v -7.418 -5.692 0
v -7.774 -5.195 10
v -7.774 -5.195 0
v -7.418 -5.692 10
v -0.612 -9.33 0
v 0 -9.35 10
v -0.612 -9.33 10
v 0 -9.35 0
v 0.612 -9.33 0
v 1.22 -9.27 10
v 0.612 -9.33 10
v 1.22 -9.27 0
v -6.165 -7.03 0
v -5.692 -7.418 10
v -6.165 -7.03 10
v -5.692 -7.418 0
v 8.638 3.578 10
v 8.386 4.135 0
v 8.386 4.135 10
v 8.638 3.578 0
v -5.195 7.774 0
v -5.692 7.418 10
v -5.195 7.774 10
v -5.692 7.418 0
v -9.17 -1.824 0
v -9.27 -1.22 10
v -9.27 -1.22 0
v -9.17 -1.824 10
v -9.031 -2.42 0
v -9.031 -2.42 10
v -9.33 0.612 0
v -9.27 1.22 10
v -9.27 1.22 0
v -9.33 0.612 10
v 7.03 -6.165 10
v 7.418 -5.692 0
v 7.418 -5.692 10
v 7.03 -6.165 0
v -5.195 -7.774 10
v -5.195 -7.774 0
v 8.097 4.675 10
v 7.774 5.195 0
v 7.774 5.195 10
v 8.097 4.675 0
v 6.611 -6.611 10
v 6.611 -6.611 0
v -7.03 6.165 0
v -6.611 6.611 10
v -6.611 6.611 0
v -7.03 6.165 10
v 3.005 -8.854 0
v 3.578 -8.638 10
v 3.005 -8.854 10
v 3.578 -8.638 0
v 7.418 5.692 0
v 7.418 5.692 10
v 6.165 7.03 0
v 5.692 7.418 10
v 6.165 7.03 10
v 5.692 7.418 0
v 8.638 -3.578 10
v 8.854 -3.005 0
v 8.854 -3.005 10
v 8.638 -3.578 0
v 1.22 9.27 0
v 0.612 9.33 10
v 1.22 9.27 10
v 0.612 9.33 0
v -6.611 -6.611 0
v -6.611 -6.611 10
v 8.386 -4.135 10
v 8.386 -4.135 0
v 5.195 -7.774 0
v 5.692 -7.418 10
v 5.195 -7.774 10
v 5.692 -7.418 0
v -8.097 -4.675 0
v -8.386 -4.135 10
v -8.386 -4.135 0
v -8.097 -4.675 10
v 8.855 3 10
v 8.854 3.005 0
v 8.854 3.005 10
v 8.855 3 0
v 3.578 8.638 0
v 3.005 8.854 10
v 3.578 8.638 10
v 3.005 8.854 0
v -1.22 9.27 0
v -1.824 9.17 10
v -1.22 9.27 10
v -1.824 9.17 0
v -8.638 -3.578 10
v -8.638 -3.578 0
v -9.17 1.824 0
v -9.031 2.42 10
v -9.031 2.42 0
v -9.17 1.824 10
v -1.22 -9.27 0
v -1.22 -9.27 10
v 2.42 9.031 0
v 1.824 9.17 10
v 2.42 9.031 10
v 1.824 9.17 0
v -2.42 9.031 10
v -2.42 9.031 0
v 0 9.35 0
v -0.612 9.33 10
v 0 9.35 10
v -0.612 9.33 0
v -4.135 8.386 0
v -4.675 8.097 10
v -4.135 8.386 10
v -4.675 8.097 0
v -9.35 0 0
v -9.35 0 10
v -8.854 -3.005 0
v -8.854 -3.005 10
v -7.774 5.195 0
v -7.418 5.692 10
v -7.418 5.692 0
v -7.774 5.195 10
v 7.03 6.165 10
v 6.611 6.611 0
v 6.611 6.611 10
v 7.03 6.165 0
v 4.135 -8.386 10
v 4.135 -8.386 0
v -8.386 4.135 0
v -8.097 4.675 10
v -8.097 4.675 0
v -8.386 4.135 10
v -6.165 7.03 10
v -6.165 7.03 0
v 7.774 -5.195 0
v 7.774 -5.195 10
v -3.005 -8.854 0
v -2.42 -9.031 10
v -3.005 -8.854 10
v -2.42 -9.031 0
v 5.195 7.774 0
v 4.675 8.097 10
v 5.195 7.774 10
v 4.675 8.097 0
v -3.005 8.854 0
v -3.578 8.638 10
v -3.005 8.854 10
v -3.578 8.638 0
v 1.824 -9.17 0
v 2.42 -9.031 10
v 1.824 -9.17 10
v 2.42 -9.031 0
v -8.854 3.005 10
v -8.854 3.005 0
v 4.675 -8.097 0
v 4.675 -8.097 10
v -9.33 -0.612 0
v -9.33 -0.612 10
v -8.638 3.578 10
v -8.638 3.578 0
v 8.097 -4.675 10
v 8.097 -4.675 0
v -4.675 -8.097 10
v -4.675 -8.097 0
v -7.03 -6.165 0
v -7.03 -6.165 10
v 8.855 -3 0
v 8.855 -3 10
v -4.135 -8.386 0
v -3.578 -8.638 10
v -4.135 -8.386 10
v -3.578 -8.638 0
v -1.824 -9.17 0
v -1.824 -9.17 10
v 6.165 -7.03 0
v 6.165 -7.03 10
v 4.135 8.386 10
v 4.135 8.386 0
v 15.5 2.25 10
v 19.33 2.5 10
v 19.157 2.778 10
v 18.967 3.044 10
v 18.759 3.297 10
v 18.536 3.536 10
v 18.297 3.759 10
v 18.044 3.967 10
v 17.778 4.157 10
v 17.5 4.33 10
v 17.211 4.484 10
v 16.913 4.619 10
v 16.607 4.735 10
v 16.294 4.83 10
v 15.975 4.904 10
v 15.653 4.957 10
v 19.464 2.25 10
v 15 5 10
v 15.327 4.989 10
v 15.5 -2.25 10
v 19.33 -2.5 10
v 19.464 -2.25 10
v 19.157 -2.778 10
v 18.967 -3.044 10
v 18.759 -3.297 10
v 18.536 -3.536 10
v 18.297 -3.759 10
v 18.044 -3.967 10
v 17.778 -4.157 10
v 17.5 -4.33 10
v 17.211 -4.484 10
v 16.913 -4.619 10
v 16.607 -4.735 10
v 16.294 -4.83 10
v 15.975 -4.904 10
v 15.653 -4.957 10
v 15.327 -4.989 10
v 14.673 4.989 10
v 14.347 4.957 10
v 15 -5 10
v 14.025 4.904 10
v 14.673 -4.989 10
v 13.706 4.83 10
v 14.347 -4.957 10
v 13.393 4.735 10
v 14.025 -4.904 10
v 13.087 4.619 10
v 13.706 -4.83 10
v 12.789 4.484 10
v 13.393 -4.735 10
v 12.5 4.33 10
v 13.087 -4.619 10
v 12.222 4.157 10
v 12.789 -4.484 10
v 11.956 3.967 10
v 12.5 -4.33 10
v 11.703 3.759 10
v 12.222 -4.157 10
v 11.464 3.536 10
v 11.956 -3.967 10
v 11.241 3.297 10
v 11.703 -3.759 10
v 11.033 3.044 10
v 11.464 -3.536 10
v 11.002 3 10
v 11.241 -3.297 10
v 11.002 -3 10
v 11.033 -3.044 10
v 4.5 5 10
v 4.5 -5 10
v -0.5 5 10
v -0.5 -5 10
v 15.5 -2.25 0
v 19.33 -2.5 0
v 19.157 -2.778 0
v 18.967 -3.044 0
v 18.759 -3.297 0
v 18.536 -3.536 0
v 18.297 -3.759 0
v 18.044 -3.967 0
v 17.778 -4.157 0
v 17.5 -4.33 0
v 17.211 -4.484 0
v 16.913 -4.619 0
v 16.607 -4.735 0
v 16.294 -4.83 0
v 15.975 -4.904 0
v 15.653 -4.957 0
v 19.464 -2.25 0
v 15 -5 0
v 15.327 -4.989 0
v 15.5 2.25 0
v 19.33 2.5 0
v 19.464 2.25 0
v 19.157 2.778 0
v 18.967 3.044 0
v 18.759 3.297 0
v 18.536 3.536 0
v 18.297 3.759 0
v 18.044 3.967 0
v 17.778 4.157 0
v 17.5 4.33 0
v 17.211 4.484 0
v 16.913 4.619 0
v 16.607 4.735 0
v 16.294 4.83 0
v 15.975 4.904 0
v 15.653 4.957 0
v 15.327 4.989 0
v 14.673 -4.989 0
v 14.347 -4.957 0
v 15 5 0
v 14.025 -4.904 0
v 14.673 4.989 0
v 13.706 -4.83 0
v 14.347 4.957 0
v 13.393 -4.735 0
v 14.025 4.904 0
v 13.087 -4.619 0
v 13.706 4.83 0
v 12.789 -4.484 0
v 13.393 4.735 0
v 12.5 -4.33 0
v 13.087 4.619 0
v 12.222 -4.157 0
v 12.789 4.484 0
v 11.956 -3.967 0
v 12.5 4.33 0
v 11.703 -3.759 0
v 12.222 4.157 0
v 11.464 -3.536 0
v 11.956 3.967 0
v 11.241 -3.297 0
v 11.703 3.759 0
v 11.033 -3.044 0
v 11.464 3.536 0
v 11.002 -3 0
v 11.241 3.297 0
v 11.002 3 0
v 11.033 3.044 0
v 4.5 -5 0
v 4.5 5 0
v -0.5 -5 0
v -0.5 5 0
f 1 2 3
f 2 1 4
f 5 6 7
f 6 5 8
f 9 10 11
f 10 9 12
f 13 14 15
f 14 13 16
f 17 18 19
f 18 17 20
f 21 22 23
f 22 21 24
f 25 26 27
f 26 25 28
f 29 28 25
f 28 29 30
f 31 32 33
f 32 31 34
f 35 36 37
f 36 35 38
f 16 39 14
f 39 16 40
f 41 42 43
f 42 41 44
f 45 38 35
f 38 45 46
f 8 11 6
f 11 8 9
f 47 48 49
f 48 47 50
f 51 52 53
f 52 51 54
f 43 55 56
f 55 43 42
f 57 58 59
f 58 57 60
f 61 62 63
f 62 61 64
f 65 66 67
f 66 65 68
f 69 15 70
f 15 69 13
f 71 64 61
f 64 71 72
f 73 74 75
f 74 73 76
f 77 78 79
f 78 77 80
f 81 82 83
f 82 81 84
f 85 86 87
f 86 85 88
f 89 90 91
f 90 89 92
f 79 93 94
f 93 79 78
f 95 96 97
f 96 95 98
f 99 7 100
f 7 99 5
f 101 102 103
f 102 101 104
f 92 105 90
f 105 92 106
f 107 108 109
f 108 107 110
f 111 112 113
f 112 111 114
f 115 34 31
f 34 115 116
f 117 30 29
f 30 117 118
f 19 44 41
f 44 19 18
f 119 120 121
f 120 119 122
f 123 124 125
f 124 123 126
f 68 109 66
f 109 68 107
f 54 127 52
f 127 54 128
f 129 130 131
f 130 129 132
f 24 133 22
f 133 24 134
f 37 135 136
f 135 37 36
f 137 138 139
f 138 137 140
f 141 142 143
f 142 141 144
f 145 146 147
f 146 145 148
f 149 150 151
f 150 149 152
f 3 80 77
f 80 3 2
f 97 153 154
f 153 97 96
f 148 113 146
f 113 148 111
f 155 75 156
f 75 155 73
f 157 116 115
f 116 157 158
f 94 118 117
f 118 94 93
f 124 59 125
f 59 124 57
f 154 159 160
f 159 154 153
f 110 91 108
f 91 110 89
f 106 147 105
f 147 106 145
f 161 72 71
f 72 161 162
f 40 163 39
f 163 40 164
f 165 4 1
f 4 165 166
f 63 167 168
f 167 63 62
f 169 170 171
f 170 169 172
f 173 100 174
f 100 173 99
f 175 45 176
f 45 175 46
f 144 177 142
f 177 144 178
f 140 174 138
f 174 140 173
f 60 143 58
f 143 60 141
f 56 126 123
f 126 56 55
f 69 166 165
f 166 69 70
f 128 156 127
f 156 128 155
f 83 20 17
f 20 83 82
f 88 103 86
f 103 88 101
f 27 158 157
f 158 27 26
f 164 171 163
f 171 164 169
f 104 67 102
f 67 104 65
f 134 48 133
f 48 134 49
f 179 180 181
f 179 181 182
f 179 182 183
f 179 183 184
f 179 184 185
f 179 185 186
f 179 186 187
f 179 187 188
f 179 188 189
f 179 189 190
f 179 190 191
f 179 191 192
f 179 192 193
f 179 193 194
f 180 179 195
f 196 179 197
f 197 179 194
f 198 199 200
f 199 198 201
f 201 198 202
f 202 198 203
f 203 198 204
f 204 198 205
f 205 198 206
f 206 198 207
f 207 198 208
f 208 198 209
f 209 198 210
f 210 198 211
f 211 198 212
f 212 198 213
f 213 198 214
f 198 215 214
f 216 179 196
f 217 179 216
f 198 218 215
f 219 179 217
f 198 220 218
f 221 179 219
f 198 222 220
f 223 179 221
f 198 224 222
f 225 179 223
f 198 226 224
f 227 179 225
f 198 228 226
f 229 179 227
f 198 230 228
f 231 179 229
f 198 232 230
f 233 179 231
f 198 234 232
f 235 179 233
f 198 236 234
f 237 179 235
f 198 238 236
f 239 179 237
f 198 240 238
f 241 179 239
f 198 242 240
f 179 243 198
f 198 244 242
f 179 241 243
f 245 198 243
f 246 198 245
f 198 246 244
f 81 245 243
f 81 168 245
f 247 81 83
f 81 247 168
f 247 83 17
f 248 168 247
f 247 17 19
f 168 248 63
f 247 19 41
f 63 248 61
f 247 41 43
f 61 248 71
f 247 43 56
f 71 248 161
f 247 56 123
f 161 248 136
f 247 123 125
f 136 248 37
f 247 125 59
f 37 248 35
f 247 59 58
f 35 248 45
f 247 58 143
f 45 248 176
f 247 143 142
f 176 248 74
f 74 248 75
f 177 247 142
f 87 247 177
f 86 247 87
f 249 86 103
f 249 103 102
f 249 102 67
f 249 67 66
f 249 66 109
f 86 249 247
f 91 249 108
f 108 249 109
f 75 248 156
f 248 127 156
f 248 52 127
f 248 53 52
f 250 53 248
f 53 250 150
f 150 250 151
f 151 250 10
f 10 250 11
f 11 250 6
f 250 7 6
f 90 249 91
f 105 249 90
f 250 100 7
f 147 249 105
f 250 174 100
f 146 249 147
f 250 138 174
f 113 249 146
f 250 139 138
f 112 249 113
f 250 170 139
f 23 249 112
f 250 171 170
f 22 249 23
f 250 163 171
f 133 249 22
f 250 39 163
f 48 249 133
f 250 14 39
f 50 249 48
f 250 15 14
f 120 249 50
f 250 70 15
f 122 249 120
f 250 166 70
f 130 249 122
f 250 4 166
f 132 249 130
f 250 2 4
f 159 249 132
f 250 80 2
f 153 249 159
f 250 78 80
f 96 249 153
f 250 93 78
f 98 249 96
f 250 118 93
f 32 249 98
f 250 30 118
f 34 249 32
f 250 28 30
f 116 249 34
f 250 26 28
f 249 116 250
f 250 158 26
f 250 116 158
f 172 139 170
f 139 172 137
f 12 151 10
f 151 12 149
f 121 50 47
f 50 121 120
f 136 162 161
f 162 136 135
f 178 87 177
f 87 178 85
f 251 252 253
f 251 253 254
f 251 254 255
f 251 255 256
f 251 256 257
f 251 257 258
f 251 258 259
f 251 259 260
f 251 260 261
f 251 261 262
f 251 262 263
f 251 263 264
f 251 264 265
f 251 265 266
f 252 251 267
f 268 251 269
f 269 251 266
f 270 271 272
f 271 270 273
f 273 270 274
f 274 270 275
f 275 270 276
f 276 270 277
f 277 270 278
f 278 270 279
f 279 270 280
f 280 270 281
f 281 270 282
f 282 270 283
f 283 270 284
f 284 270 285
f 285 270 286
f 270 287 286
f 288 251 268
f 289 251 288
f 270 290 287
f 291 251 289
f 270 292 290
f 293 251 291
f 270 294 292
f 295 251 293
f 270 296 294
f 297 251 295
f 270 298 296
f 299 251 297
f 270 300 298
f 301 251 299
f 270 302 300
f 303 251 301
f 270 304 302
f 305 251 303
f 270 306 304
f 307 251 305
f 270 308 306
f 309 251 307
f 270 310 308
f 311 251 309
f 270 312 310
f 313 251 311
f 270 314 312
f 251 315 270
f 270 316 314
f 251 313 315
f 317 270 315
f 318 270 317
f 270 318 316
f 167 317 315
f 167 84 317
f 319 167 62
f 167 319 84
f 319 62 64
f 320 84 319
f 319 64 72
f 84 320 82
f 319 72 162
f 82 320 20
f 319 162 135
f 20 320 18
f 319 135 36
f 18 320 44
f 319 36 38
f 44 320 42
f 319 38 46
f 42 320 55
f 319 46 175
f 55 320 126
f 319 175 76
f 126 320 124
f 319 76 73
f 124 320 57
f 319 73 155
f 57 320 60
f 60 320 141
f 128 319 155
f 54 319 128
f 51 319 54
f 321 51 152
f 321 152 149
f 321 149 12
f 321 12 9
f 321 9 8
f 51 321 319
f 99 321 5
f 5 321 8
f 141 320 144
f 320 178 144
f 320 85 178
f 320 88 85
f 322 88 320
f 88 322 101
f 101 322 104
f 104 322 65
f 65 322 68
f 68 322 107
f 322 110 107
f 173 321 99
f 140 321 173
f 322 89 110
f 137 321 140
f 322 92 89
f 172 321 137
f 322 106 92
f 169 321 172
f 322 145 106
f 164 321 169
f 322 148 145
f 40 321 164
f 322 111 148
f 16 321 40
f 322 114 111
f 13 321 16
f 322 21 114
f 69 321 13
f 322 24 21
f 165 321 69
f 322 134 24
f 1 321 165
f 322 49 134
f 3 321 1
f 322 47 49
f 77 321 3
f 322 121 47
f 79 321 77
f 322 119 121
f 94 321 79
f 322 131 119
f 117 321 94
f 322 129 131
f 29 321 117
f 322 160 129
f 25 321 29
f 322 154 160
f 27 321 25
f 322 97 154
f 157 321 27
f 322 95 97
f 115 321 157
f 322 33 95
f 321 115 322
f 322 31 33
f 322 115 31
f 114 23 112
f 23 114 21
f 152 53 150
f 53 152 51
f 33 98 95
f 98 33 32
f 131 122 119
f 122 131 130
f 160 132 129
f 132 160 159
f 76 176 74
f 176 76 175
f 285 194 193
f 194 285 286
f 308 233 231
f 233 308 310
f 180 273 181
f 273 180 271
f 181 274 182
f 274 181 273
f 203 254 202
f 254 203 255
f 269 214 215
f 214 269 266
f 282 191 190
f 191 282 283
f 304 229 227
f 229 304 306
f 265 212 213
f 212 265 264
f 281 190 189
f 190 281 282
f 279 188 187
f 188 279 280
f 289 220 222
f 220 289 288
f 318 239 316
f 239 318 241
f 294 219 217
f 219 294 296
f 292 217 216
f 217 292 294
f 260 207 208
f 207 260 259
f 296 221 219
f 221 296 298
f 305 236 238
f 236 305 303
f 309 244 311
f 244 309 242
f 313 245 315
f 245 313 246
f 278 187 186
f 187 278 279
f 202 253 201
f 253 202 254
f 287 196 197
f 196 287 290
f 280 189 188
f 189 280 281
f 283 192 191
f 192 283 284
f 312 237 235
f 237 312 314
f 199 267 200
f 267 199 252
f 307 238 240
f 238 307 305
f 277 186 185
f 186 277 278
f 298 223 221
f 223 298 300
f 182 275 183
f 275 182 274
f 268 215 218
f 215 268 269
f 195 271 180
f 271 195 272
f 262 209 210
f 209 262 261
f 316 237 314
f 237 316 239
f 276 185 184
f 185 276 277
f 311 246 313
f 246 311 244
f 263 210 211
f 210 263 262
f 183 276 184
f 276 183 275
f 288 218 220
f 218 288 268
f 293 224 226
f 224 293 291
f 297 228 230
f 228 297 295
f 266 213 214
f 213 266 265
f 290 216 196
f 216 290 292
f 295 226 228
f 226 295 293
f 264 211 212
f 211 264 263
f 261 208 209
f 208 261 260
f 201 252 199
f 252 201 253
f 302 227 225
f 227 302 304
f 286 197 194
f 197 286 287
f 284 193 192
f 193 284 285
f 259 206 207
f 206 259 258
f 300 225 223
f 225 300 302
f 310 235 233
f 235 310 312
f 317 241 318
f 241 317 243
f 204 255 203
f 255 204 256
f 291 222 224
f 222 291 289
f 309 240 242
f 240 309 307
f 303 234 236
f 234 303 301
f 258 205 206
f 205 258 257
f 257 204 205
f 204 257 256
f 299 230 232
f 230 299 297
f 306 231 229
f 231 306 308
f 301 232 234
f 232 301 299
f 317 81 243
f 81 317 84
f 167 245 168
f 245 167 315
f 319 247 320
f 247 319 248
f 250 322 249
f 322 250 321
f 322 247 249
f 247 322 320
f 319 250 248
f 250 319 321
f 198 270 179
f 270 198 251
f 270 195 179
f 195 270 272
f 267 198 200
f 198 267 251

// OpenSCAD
// Tubing clip for 12.7 mm lab stand rod
// Print orientation: flat on bed, extrusion up (+Z)

// ---- Dimensions (mm) ----
rod_d      = 12.7;   // stand rod diameter
ring_w     = 3;      // rod ring wall thickness
ring_od    = rod_d + 2 * ring_w; // rod ring outer diameter (18.7)
ring_h     = 10;     // clip height (Z)

tub_d      = 6;      // tubing ring inner diameter
tub_w      = 2;      // tubing ring wall thickness
tub_od     = tub_d + 2 * tub_w; // tubing ring outer diameter (10)
tub_x      = 15;     // tubing ring centre X
tub_y      = 0;      // tubing ring centre Y

bridge_x0  = 8;      // bridge start X
bridge_x1  = 12;     // bridge end X
bridge_w   = 6;      // bridge width (Y)

eps        = 0.5;    // cutter overshoot

$fn = 96;

// ---- Model ----
difference() {
    union() {
        // Rod ring
        cylinder(d = ring_od, h = ring_h);
        // Tubing ring
        translate([tub_x, tub_y, 0])
            cylinder(d = tub_od, h = ring_h);
        // Solid bridge
        translate([bridge_x0, -bridge_w / 2, 0])
            cube([bridge_x1 - bridge_x0, bridge_w, ring_h]);
    }
    // Opening in rod ring (-X side)
    translate([-eps, -5, -eps])
        cube([5, 10, ring_h + 2 * eps]);
    // Opening in tubing ring (+X side)
    translate([tub_x + eps, -2.25, -eps])
        cube([4.5, 4.5, ring_h + 2 * eps]);
}
